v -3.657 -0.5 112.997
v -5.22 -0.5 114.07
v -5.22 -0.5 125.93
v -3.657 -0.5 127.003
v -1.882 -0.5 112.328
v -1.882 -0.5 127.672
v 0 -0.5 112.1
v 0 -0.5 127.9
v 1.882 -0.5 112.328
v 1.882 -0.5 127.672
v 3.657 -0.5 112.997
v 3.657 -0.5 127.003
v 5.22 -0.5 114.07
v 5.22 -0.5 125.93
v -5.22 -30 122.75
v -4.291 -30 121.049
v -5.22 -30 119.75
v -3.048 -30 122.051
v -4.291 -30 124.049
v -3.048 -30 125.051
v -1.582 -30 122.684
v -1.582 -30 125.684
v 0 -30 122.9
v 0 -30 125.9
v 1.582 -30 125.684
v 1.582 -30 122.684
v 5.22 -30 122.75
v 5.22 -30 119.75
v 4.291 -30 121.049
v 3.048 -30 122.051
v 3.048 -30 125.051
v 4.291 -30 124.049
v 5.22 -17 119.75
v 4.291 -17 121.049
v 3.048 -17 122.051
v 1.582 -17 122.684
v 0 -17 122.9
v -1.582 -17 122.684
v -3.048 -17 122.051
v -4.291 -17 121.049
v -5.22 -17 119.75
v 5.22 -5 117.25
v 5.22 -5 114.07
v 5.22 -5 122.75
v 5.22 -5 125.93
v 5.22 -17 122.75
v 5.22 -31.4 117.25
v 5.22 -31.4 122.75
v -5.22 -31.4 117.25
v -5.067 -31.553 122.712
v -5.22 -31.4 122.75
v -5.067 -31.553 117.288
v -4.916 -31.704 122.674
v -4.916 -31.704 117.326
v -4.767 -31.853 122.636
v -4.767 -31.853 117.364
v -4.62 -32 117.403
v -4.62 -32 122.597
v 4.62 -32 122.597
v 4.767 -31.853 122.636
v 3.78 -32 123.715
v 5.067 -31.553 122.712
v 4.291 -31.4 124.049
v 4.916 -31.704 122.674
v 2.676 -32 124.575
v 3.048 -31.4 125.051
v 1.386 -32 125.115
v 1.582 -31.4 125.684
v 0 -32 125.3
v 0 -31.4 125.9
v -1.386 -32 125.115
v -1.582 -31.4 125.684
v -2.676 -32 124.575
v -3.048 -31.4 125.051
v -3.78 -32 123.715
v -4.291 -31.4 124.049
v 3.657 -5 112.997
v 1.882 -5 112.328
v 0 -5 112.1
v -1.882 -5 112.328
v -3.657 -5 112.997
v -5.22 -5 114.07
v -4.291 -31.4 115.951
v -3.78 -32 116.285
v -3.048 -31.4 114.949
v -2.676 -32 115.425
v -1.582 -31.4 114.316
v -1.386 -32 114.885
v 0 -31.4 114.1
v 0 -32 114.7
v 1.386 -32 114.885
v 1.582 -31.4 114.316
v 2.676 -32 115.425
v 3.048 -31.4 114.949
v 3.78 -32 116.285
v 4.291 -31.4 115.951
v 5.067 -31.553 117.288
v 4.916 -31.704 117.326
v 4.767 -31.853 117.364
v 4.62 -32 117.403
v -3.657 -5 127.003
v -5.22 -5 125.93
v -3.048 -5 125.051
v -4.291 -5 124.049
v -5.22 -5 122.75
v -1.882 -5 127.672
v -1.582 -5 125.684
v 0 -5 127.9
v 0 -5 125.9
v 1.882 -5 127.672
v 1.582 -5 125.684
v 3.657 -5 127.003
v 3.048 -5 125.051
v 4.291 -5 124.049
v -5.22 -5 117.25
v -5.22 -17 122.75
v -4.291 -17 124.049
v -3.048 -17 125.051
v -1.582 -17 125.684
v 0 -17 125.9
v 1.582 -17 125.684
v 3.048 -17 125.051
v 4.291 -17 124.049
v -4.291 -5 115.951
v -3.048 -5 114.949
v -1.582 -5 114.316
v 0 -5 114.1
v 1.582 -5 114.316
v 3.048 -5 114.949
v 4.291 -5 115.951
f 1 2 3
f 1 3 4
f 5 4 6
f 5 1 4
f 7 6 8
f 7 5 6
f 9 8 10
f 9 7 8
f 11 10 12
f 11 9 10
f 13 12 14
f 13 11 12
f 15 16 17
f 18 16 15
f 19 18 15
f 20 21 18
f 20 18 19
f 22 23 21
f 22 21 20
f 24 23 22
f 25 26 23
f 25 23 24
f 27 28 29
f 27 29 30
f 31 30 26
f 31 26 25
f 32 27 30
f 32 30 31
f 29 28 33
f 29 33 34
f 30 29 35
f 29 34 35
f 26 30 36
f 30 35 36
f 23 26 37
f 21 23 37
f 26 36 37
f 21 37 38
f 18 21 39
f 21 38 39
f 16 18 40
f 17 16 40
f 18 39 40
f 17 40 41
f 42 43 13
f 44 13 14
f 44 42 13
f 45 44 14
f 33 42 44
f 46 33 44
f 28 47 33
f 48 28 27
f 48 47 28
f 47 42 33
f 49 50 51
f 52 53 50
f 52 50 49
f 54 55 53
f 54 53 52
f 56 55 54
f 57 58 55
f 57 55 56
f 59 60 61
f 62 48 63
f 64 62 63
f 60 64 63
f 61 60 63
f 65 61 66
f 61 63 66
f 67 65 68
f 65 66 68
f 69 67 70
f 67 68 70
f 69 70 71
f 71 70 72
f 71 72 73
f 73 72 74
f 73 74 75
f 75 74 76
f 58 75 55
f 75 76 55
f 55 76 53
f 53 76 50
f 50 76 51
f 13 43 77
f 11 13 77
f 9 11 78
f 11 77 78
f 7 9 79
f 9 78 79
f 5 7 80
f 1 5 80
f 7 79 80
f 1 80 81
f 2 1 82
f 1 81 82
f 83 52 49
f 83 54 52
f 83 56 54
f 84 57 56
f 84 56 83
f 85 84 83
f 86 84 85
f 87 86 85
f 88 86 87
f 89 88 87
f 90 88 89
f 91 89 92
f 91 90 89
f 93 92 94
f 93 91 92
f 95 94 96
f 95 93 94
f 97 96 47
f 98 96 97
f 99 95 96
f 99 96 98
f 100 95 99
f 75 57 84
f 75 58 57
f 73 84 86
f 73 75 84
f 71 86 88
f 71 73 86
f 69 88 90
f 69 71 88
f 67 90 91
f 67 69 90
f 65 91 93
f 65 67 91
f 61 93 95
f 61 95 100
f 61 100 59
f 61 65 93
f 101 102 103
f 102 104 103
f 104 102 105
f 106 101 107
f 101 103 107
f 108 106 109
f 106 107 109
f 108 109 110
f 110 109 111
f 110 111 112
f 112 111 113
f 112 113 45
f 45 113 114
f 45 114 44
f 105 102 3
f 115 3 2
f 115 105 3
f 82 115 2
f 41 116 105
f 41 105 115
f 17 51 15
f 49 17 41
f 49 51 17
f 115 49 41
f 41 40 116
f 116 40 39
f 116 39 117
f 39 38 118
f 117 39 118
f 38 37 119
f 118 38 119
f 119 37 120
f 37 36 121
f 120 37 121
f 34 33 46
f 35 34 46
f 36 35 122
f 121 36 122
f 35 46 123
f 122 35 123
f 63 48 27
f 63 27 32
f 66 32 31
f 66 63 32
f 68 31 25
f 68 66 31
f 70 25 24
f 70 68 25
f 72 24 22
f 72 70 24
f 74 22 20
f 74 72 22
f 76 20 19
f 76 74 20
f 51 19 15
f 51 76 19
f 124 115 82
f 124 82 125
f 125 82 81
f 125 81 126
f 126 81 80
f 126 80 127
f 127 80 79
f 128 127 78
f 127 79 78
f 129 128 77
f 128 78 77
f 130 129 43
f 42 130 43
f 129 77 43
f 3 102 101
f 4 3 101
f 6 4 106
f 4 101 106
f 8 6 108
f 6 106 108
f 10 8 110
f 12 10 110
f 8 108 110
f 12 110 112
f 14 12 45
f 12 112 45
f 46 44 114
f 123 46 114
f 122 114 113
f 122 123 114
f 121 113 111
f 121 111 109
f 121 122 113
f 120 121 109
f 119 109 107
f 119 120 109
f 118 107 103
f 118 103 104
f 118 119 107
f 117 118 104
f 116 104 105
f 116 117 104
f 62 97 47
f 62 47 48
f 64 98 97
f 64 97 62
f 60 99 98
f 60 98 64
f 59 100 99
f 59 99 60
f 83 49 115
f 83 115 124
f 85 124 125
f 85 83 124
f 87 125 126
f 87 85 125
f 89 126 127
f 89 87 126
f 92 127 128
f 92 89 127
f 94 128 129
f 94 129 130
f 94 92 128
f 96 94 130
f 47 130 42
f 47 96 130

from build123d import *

# Parameters (mm, degrees)
PAD001002_DEPTH      = 17
PAD001002_DEPTH_BACK = 10
PAD001003_DEPTH      = 4.5
SKETCH006_W          = 10
SKETCH006_H          = 13
POCKET002_DEPTH      = 10.440828
CHAMFER_SIZE         = 0.6
PAD001004_DEPTH      = 13


with BuildPart() as part:
    # Sketch004 → Pad001002 (new body, two sides)
    with BuildSketch(Plane.XZ.offset(15)) as pad001002_sk:
        with BuildLine():
            ThreePointArc((-5.219914, 117.25), (0, 114.1), (5.219914, 117.25))
            Line((5.219914, 117.25), (5.219914, 122.75))
            ThreePointArc((5.219914, 122.75), (0, 125.9), (-5.219914, 122.75))
            Line((-5.219914, 122.75), (-5.219914, 117.25))
        make_face()
    extrude(amount=PAD001002_DEPTH)
    extrude(pad001002_sk.sketch, amount=-PAD001002_DEPTH_BACK)

    # Sketch005 → Pad001003 (new body)
    with BuildSketch(Plane(origin=(0, -5, 0), x_dir=(1, 0, 0), z_dir=(0, 1, 0))):
        with BuildLine():
            ThreePointArc((5.219914, -114.070202), (0, -112.1), (-5.219914, -114.070202))
            Line((-5.219914, -125.929798), (-5.219914, -114.070202))
            ThreePointArc((-5.219914, -125.929798), (0, -127.9), (5.219914, -125.929798))
            Line((5.219914, -114.070202), (5.219914, -125.929798))
        make_face()
    extrude(amount=PAD001003_DEPTH)

    # Sketch006 → Pocket002 (cut, through all)
    with BuildSketch(Plane(origin=(5.219914, -15, 0), x_dir=(0, 0, 1), z_dir=(1, 0, 0))):
        with Locations((124.75, 8.5)):
            Rectangle(SKETCH006_W, SKETCH006_H)
    extrude(amount=-POCKET002_DEPTH, mode=Mode.SUBTRACT)

    # Chamfer
    chamfer_edges = [part.edges().sort_by_distance(p)[0] for p in [
        (0, -32, 114.1),
        (5.219914, -32, 120),
        (0, -32, 125.9),
        (-5.219914, -32, 120),
    ]]
    chamfer(chamfer_edges, length=CHAMFER_SIZE)

    # Sketch007 → Pad001004 (new body)
    with BuildSketch(Plane.XZ.offset(17)):
        with BuildLine():
            ThreePointArc((5.219914, 119.75), (0, 122.9), (-5.219914, 119.75))
            Line((-5.219914, 119.75), (5.219914, 119.75))
        make_face()
    extrude(amount=PAD001004_DEPTH)


solid = part.part
